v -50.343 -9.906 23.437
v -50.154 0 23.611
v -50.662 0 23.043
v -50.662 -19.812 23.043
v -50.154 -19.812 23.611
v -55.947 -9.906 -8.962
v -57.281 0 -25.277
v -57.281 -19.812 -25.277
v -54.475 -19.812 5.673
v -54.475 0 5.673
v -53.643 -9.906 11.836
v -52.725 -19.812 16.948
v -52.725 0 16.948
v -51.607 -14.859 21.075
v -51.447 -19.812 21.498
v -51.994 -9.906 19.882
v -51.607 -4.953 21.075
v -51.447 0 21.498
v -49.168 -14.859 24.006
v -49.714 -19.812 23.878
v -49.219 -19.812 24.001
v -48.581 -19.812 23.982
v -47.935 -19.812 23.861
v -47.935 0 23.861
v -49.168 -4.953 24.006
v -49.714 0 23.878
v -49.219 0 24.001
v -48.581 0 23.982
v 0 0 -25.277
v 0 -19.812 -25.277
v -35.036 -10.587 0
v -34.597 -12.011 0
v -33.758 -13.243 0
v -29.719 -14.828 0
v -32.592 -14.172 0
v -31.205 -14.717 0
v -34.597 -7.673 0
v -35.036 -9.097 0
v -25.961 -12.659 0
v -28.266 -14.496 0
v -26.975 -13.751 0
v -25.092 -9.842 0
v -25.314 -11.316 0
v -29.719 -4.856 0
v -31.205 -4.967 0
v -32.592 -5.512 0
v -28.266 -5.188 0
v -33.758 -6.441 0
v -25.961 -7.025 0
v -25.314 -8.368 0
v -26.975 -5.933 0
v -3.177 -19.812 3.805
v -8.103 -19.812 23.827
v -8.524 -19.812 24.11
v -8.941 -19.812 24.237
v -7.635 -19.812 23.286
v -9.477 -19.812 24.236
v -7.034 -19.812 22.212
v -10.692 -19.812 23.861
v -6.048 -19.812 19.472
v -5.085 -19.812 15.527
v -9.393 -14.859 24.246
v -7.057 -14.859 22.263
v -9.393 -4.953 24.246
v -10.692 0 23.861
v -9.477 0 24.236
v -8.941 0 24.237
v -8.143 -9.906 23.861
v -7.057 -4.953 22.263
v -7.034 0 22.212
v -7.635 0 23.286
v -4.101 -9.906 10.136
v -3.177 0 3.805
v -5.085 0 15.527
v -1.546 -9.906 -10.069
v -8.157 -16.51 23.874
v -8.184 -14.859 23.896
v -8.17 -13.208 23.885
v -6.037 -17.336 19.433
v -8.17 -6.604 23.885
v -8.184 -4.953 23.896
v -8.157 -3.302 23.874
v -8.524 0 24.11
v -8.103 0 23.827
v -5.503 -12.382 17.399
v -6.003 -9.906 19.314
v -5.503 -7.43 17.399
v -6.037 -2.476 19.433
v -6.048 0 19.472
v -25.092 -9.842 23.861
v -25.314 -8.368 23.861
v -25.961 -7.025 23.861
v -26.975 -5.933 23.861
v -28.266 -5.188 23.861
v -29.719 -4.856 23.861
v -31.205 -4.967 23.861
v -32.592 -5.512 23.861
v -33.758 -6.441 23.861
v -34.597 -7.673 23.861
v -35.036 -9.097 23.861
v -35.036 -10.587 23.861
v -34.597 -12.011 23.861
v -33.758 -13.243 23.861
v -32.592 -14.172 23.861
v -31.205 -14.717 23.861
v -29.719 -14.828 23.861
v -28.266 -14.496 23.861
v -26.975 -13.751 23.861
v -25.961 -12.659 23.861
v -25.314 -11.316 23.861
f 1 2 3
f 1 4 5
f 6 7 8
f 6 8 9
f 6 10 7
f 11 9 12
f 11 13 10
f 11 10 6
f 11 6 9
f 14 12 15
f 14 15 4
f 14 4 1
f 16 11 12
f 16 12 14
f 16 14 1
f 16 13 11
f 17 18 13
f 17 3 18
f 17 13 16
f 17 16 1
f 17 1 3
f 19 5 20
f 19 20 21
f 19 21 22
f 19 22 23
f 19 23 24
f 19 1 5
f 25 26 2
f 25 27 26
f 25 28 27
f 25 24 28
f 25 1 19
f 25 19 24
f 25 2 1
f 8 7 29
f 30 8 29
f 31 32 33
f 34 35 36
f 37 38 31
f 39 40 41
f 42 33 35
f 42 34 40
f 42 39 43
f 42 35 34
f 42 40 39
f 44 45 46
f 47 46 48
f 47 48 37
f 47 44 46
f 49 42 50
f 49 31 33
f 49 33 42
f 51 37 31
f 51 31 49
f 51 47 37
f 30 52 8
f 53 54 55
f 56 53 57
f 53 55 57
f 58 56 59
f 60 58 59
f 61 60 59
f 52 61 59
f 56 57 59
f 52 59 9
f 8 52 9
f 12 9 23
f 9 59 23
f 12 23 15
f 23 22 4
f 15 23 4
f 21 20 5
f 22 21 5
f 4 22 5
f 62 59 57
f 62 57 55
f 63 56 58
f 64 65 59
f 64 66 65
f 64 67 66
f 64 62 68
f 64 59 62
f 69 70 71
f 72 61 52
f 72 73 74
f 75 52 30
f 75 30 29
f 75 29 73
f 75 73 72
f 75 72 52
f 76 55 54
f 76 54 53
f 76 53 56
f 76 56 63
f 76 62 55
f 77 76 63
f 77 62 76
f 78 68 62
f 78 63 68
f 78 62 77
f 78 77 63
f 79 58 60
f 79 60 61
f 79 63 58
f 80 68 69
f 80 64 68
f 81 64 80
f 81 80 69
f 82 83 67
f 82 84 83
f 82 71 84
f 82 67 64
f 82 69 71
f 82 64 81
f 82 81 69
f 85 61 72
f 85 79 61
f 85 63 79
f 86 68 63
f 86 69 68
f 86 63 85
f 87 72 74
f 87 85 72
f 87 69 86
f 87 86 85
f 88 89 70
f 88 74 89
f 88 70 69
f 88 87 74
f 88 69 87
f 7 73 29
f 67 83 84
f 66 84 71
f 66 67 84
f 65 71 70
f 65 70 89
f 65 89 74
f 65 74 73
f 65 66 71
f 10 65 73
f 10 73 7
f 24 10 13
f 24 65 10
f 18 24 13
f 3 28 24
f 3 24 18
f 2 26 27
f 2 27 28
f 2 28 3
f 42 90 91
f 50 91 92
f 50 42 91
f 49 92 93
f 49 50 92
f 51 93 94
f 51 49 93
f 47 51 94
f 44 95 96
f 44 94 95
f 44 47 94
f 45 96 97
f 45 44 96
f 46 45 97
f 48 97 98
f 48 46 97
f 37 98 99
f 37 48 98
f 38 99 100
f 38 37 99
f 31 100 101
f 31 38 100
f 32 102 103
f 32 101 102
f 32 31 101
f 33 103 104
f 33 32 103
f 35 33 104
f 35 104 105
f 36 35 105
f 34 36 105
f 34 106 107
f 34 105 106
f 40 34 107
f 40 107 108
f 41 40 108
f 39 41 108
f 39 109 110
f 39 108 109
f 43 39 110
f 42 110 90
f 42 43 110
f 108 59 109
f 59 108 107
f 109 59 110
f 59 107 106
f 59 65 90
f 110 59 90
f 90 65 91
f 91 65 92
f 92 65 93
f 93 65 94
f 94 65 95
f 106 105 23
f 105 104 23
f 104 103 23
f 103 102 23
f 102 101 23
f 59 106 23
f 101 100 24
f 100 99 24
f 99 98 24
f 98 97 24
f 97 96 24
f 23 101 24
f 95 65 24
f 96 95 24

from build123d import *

# Parameters (mm, degrees)
F1_DEPTH = 19.812
F2_R     = 5
F3_DEPTH = 29.972


with BuildPart() as f1:
    # F0 (on Front) → F1 (new body)
    with BuildSketch(Plane.XZ):
        with BuildLine():
            add(Edge.make_bspline(
                [(-57.2814941406, -25.2774953842), (-55.4948378039, -2.6600567826), (-53.3099503119, 24.9986247928), (-48.7638040936, 24.0367135251), (-47.9351952672, 23.8613896072)],
                knots=[0, 0, 0, 0, 0.8177337933, 1, 1, 1, 1], degree=3))
            Line((-57.2814941406, -25.2774953842), (0, -25.2774953842))
            add(Edge.make_bspline(
                [(-10.691601783, 23.8613896072), (-9.820200524, 24.2031852968), (-5.0967860131, 26.0558825509), (-2.289435327, -2.2189544531), (0, -25.2774953842)],
                knots=[0, 0, 0, 0, 0.1844854516, 1, 1, 1, 1], degree=3))
            Line((-10.691601783, 23.8613896072), (-47.9351952672, 23.8613896072))
        make_face()
    extrude(amount=F1_DEPTH)

    # F2 (on Top) → F3 (cut)
    with BuildSketch(Plane.XY):
        with Locations((-30.0922561437, -9.8419375718)):
            Circle(F2_R)
    extrude(amount=F3_DEPTH, mode=Mode.SUBTRACT)


solid = f1.part
